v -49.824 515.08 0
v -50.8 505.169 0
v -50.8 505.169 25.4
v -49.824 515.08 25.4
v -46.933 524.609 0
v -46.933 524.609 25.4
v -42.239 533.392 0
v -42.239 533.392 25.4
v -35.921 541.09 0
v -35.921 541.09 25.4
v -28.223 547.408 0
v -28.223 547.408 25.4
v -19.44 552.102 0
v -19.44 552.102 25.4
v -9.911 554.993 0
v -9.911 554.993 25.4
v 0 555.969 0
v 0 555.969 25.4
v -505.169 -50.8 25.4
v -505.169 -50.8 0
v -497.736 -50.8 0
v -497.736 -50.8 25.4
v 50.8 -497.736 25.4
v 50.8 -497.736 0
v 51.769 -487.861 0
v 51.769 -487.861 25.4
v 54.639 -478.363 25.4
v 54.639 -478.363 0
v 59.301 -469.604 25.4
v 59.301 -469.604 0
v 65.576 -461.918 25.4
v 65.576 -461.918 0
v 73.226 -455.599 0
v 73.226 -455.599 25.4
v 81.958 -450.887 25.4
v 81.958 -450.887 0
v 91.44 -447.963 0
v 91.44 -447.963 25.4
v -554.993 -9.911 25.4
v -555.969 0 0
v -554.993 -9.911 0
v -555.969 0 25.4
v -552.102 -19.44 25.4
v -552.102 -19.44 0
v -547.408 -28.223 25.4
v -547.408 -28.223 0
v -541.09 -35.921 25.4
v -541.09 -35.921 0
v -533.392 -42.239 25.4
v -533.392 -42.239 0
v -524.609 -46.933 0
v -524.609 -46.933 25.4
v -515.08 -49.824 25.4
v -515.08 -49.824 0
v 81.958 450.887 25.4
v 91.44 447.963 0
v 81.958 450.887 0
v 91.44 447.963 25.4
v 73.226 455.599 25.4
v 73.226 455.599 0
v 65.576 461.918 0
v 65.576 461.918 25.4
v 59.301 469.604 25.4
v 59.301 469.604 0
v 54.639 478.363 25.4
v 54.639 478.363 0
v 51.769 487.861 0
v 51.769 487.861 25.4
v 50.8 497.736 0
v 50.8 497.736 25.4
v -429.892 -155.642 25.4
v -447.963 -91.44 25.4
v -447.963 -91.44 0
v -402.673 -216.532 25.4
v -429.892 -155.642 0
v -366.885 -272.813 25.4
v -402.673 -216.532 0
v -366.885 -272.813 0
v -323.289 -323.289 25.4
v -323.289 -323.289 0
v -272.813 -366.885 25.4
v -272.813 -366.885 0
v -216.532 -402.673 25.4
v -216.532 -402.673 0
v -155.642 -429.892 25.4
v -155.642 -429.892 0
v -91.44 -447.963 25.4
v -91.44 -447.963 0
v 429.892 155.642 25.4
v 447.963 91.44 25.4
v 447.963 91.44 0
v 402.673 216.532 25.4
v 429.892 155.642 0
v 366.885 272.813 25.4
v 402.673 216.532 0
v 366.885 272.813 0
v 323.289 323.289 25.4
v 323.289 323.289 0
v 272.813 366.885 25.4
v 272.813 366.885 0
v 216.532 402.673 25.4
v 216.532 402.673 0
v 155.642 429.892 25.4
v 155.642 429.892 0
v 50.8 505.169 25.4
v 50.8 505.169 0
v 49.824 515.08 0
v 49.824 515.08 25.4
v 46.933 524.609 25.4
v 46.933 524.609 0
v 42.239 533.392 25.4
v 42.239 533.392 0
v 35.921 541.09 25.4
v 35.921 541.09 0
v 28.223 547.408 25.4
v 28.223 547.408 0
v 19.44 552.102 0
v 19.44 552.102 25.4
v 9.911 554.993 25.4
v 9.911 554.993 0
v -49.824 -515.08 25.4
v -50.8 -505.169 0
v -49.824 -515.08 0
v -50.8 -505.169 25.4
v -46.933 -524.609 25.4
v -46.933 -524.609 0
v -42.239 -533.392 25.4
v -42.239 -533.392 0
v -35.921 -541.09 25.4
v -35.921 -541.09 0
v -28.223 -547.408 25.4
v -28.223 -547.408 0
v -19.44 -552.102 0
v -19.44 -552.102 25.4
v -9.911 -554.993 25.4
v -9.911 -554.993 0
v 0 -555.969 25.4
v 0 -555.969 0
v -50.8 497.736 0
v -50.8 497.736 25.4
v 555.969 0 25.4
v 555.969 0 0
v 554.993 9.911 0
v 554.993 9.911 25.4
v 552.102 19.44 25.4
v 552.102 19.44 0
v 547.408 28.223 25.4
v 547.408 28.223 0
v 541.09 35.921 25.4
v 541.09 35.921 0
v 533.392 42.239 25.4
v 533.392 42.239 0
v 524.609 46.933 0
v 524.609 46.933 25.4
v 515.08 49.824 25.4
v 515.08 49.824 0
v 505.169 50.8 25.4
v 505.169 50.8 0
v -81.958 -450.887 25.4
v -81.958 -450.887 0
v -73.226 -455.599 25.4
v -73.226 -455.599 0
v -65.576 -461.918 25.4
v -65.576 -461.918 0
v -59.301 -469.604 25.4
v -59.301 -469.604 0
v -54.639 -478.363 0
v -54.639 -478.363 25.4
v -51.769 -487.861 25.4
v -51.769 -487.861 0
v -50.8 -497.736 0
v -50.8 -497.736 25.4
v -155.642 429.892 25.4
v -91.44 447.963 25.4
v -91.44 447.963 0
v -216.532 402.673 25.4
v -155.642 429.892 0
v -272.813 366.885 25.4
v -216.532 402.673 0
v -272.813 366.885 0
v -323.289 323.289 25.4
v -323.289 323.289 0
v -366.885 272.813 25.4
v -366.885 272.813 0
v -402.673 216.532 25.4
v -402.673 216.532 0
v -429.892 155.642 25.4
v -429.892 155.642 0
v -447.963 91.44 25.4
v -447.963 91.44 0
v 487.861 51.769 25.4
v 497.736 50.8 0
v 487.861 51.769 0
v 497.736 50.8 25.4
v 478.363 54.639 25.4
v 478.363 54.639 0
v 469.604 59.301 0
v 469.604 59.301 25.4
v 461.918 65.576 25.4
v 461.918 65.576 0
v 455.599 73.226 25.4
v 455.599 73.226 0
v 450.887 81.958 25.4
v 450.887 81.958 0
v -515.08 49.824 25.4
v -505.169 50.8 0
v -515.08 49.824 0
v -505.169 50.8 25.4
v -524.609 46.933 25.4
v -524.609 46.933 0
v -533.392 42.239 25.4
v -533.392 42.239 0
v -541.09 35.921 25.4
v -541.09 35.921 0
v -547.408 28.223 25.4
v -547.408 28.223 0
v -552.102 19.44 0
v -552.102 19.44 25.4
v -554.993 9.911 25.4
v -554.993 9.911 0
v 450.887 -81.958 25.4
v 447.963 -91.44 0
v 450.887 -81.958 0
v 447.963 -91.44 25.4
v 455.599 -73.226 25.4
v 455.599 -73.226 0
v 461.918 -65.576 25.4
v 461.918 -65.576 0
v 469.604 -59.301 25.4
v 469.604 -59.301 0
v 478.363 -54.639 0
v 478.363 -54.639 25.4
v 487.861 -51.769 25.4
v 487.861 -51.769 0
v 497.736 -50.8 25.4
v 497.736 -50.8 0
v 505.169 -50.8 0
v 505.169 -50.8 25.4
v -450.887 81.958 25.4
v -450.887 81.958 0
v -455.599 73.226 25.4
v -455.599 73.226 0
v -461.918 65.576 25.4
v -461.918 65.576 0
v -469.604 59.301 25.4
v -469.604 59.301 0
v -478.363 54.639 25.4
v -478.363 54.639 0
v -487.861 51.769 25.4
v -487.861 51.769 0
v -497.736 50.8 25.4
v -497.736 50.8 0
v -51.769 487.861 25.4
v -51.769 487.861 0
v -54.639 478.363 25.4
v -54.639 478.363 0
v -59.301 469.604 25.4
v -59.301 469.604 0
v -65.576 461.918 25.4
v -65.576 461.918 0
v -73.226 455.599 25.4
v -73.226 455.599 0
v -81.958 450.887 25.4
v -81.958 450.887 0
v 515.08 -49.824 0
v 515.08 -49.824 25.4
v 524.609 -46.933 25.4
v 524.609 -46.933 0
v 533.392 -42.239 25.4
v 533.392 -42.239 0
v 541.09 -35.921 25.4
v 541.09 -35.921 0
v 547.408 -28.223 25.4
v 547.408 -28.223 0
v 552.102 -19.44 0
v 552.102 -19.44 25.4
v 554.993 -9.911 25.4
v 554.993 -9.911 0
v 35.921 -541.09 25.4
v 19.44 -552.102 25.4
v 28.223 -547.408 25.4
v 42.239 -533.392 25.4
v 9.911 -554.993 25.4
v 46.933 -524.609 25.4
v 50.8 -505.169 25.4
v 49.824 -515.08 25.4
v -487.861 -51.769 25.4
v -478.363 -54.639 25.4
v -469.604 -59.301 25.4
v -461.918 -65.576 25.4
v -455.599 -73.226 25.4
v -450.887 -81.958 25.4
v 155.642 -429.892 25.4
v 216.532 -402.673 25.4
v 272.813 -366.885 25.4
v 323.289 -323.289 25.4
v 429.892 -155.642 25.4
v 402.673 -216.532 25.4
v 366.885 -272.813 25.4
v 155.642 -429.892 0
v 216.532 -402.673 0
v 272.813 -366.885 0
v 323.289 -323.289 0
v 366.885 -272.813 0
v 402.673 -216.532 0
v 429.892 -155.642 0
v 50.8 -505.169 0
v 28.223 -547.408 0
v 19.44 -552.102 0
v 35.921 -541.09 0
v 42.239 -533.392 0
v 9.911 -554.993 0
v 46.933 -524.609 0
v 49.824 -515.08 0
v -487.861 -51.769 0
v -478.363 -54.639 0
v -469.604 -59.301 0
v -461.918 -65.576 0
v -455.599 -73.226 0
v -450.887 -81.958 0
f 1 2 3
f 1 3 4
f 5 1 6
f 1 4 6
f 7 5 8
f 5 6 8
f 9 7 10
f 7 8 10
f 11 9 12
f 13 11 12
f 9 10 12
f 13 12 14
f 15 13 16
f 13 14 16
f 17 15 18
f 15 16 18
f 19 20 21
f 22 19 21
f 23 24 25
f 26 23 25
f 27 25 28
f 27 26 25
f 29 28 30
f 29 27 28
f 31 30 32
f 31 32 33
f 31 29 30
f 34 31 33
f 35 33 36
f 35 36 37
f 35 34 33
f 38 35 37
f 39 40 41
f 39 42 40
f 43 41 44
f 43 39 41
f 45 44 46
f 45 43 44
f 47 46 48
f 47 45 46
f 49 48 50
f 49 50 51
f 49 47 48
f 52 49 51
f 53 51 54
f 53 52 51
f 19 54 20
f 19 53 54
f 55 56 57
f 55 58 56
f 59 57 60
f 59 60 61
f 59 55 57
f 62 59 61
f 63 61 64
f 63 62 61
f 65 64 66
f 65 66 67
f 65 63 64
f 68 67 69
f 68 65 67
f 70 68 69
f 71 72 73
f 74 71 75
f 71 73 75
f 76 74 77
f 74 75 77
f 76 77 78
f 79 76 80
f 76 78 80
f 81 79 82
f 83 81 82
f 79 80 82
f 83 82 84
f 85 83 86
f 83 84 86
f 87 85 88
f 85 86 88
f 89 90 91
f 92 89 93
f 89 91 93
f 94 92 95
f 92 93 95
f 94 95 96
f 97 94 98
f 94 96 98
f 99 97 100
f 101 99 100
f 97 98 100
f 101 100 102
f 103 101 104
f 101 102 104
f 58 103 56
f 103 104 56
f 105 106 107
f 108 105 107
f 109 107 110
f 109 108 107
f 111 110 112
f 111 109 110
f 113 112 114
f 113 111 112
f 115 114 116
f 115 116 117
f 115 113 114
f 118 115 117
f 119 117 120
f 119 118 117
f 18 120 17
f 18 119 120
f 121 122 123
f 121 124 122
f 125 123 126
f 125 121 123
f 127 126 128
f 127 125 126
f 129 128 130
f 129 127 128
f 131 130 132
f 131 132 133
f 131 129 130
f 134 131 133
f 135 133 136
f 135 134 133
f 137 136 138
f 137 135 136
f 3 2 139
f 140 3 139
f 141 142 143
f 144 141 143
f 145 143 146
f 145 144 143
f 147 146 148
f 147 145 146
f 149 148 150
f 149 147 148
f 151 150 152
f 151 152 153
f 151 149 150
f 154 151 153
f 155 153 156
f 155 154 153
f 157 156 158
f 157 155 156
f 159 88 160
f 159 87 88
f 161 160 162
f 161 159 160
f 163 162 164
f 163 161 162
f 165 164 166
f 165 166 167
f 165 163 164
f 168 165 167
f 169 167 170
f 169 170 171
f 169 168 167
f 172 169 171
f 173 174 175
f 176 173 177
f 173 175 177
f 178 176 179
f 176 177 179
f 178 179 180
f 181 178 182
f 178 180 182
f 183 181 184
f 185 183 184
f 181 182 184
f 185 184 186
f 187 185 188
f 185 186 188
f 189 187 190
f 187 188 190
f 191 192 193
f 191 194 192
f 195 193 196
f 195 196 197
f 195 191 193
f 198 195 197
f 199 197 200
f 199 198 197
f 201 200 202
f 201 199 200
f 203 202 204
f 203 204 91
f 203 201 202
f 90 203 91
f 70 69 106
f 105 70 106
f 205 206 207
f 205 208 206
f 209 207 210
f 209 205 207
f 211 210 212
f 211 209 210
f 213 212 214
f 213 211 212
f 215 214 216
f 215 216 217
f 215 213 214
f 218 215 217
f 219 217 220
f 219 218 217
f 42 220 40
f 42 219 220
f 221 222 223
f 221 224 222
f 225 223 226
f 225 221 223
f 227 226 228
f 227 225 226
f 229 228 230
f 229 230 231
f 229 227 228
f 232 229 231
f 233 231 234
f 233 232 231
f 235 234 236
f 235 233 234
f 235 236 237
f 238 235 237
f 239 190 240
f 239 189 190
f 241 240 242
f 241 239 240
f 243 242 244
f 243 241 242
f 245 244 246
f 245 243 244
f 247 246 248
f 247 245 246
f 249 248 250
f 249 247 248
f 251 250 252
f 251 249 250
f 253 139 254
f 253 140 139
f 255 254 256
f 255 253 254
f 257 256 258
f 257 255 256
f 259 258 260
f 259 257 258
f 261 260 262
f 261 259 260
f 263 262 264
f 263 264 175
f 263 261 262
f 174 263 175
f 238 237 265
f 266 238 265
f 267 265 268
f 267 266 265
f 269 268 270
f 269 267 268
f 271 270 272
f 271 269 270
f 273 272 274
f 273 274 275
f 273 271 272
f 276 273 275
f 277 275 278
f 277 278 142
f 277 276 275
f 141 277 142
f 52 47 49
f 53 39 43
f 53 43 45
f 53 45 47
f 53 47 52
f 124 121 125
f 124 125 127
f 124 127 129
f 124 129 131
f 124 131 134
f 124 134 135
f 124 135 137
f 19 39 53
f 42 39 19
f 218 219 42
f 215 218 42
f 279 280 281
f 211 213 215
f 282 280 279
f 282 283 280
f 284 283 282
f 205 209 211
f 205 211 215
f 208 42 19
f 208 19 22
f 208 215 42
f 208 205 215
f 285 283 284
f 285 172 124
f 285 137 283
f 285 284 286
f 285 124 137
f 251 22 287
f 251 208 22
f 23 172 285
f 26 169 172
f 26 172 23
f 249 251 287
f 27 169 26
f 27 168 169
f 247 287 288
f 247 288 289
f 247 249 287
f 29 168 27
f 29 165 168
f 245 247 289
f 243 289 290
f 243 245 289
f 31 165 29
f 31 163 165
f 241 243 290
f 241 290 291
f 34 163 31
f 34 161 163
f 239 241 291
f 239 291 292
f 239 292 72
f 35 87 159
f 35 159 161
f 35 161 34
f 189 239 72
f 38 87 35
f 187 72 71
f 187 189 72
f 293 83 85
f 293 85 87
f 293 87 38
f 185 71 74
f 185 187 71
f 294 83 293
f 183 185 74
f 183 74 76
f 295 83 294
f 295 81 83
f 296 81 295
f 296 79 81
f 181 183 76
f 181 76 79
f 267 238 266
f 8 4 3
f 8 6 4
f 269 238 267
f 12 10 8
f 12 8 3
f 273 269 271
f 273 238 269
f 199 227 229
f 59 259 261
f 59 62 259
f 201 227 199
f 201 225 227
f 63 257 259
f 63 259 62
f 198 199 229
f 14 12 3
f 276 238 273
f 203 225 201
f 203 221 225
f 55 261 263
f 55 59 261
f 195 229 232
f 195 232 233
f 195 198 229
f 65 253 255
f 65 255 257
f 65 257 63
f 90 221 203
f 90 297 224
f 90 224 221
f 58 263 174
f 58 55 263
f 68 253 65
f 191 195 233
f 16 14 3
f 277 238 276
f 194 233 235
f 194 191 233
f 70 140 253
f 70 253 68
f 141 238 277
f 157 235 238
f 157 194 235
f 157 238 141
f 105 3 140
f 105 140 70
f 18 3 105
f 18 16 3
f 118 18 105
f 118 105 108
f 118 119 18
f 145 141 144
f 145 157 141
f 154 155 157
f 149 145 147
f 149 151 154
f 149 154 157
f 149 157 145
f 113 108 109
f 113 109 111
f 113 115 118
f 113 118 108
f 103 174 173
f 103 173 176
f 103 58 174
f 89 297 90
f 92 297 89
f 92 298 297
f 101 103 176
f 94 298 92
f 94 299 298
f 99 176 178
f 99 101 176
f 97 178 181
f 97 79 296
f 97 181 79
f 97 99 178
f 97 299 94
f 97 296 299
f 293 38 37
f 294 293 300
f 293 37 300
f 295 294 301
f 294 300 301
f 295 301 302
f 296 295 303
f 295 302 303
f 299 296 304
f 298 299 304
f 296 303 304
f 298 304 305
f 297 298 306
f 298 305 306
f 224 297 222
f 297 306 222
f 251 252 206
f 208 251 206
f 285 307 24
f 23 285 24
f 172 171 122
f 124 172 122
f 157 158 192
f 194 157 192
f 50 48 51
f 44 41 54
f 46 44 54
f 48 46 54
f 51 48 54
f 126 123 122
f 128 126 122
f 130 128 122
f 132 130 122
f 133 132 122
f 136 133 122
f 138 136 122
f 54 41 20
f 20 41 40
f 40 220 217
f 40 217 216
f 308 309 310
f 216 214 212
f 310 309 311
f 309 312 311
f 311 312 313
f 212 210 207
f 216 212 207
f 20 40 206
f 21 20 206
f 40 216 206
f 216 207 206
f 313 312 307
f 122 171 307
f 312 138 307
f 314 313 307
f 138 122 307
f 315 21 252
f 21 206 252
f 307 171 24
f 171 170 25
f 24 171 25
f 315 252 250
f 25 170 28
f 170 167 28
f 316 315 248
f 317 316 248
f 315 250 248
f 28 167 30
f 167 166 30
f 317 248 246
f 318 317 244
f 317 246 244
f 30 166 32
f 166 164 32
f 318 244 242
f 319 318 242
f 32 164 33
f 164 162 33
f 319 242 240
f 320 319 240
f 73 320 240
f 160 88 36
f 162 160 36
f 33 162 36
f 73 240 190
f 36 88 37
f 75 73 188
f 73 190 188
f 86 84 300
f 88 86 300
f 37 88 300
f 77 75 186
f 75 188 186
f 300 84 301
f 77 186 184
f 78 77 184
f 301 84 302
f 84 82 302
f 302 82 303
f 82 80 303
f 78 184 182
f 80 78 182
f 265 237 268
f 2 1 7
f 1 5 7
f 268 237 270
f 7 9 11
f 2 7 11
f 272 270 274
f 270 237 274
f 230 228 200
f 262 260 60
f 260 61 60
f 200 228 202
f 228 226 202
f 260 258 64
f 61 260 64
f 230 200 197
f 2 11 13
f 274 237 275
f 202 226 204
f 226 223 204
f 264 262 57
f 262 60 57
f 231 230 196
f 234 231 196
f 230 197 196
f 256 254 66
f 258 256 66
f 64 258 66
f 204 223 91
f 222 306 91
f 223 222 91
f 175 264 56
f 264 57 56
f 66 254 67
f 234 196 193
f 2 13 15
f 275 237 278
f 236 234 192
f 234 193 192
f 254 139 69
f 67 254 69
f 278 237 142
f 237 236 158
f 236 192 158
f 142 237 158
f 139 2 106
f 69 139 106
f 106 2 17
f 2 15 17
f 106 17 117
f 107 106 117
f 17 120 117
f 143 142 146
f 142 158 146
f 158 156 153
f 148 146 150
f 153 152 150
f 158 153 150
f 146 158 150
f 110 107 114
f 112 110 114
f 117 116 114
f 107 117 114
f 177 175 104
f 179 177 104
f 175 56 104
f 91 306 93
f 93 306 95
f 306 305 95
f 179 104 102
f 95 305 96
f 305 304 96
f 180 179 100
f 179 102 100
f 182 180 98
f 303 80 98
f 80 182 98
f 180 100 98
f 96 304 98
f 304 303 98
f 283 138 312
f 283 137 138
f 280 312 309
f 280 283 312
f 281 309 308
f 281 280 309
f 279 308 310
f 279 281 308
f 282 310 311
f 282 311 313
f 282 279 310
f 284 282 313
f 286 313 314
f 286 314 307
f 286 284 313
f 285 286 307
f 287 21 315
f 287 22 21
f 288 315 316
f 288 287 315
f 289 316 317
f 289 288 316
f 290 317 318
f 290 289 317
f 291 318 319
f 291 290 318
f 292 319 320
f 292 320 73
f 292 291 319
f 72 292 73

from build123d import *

# Parameters (mm, degrees)
F1_DEPTH = 25.4
F2_R     = 50.79999


# Not quite as in the source:
# - a fillet or chamfer is up to 0.001 mm smaller than in the source, because OpenCascade refuses the exact size


with BuildPart() as f1:
    # F0 (on Top) → F1 (new body)
    with BuildSketch(Plane.XY):
        with BuildLine():
            Line((-50.8, 555.969013028), (-50.8, 454.369013028))
            ThreePointArc((-50.8, 454.369013028), (-323.2892203585, 323.2892203585), (-454.369013028, 50.8))
            Line((-454.369013028, 50.8), (-555.969013028, 50.8))
            Line((-555.969013028, 50.8), (-555.969013028, -50.8))
            Line((-555.969013028, -50.8), (-454.369013028, -50.8))
            ThreePointArc((-454.369013028, -50.8), (-323.2892203585, -323.2892203585), (-50.8, -454.369013028))
            Line((-50.8, -454.369013028), (-50.8, -555.969013028))
            Line((-50.8, -555.969013028), (50.8, -555.969013028))
            Line((50.8, -555.969013028), (50.8, -454.369013028))
            ThreePointArc((50.8, -454.369013028), (323.2892203585, -323.2892203585), (454.369013028, -50.8))
            Line((454.369013028, -50.8), (555.969013028, -50.8))
            Line((555.969013028, -50.8), (555.969013028, 50.8))
            Line((555.969013028, 50.8), (454.369013028, 50.8))
            ThreePointArc((454.369013028, 50.8), (323.2892203585, 323.2892203585), (50.8, 454.369013028))
            Line((50.8, 454.369013028), (50.8, 555.969013028))
            Line((50.8, 555.969013028), (-50.8, 555.969013028))
        make_face()
    extrude(amount=F1_DEPTH)

    # F2 (radius 50.8 in the source; OpenCascade refuses exactly that, so slightly less here)
    f2_edges = [f1.edges().sort_by_distance(p)[0] for p in [
        (50.8, -555.969013, 12.7),
        (-50.8, -555.969013, 12.7),
        (555.969013, -50.8, 12.7),
        (555.969013, 50.8, 12.7),
        (50.8, 555.969013, 12.7),
        (-50.8, 555.969013, 12.7),
        (-555.969013, 50.8, 12.7),
        (-555.969013, -50.8, 12.7),
        (50.8, -454.369013, 12.7),
        (454.369013, -50.8, 12.7),
        (454.369013, 50.8, 12.7),
        (50.8, 454.369013, 12.7),
        (-50.8, 454.369013, 12.7),
        (-454.369013, 50.8, 12.7),
        (-454.369013, -50.8, 12.7),
        (-50.8, -454.369013, 12.7),
    ]]
    fillet(f2_edges, radius=F2_R)


solid = f1.part
